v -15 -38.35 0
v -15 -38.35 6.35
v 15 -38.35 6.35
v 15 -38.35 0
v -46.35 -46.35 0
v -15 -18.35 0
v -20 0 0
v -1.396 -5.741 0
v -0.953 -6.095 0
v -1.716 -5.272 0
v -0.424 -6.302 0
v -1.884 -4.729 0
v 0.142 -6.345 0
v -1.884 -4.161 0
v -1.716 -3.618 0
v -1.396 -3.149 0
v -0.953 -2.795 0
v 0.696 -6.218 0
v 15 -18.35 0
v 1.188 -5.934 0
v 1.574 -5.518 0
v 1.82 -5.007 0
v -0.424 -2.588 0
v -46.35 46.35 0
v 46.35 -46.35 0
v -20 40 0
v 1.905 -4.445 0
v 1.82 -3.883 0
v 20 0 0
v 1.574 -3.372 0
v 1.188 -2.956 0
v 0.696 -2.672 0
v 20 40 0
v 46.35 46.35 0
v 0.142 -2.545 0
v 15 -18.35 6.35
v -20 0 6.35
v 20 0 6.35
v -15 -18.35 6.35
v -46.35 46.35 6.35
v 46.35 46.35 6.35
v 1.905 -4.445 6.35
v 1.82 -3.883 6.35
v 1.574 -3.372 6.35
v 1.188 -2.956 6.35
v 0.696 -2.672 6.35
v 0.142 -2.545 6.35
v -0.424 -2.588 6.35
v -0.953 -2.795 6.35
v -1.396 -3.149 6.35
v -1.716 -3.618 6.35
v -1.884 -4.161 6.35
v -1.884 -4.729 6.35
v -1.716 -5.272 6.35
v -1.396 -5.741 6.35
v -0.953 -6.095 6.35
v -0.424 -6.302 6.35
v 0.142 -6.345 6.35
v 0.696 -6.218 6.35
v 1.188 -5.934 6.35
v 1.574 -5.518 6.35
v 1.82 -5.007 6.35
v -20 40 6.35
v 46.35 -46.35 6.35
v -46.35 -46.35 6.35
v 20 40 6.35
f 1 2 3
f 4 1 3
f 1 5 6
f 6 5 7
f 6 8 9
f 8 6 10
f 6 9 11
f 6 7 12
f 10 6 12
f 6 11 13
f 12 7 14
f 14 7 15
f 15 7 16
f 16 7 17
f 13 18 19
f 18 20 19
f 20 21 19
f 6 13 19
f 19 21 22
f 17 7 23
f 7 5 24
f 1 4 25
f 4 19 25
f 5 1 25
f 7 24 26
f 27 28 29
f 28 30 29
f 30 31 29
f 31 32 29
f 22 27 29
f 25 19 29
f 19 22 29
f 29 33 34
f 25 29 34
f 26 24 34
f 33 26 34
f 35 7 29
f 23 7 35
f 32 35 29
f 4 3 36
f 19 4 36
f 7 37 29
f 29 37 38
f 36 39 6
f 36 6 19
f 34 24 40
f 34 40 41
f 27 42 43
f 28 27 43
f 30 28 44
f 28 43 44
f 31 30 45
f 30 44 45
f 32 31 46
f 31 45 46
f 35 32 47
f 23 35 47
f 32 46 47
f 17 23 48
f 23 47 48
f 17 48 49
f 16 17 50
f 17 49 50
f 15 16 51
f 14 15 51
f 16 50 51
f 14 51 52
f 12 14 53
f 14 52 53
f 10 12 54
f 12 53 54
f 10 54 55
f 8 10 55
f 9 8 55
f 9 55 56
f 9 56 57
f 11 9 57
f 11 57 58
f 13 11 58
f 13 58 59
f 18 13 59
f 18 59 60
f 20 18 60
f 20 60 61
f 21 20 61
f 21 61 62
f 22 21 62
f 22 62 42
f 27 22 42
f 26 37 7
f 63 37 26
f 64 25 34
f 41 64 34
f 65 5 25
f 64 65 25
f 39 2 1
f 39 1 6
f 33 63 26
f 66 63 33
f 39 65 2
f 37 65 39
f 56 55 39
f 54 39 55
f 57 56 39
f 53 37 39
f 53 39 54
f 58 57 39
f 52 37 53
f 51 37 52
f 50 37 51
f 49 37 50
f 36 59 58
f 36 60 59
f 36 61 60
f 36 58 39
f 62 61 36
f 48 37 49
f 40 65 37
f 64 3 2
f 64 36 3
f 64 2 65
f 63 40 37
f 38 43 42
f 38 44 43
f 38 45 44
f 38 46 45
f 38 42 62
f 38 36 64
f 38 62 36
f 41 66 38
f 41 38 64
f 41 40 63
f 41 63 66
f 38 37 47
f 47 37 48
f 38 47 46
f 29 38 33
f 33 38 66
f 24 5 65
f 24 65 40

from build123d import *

# Parameters (mm, degrees)
F0_W     = 92.7
F0_H     = 92.7
F1_DEPTH = 6.35
F2_W     = 30
F2_H     = 20
F2_W_2   = 40
F2_H_2   = 40
F2_R     = 1.905
F3_DEPTH = 6.351


with BuildPart() as f1:
    # F0 (on Top) → F1 (new body)
    with BuildSketch(Plane.XY):
        Rectangle(F0_W, F0_H)
    extrude(amount=F1_DEPTH)

    # F2 (on face) → F3 (cut, through all)
    with BuildSketch(Plane.XY.offset(6.35)):
        with Locations((0, -28.35)):
            Rectangle(F2_W, F2_H)
        with Locations((0, 20)):
            Rectangle(F2_W_2, F2_H_2)
        with Locations((0, -4.445)):
            Circle(F2_R)
    extrude(amount=-F3_DEPTH, mode=Mode.SUBTRACT)


solid = f1.part
